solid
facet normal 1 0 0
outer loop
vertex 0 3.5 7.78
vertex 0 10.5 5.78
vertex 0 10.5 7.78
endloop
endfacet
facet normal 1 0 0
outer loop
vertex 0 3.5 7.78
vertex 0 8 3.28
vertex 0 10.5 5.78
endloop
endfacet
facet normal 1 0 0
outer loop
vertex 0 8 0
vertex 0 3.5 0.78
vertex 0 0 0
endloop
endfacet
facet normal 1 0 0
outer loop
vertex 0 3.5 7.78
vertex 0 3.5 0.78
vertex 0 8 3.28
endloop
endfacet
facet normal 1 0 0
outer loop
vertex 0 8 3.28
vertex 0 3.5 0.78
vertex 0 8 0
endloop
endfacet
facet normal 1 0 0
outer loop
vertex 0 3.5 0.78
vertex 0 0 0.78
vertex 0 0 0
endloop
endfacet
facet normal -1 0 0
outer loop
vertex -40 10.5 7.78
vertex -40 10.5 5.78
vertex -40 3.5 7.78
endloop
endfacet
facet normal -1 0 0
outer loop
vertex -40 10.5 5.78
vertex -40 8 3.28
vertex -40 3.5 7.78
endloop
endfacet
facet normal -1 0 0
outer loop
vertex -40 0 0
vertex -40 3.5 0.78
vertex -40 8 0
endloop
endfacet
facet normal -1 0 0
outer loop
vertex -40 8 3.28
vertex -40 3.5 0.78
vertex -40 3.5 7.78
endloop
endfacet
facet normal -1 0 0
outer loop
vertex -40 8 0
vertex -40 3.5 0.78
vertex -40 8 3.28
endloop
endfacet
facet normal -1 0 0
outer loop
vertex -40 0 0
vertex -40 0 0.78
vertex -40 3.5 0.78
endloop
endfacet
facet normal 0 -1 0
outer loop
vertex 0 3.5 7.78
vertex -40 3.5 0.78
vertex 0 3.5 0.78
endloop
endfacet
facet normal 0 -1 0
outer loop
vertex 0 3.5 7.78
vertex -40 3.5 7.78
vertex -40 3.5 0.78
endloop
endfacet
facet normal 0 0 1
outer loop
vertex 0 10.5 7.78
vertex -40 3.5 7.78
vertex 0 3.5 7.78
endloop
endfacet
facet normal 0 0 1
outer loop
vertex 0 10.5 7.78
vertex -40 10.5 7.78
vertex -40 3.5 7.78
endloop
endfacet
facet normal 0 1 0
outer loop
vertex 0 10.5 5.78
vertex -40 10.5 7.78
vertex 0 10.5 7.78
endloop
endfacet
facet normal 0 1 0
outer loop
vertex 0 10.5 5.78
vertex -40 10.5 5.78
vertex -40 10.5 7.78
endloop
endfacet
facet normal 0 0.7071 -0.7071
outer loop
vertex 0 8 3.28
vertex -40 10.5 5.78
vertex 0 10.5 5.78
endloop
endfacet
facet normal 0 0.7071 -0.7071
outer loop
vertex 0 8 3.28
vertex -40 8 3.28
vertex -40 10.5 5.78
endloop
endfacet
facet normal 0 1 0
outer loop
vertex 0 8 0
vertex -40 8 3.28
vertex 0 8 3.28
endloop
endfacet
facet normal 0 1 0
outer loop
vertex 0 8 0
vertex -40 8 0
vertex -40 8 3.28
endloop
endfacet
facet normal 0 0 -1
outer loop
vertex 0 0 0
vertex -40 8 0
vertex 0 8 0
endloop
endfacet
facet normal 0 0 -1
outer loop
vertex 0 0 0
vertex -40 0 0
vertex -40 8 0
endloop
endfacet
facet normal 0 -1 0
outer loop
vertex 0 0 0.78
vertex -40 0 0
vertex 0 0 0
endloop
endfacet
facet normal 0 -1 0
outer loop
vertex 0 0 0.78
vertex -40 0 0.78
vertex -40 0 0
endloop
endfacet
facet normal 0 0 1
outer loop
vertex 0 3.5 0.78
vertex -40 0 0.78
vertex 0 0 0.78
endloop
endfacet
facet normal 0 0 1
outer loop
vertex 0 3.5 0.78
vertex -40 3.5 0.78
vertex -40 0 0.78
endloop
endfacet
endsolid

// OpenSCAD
module extrusion_lock(len = 40) {
    rotate([270, 270, 90])
        linear_extrude(len) {
            polygon([
                [ 0,          0],
                [ 0,          8],
                [ 0.78,       8],
                [ 0.78 + 2.5, 8],
                [ 0.78 + 5,   8 + 2.5],
                [ 0.78 + 7,   8 + 2.5],
                [ 0.78 + 7,   8 - 4.5], // CURVA ACÁ
                [ 0.78 + 2.5, 8 - 4.5],
                [ 0.78      , 8 - 4.5],
                [ 0.78      , 0]
            ]);   
        }
    }
    
 extrusion_lock();
